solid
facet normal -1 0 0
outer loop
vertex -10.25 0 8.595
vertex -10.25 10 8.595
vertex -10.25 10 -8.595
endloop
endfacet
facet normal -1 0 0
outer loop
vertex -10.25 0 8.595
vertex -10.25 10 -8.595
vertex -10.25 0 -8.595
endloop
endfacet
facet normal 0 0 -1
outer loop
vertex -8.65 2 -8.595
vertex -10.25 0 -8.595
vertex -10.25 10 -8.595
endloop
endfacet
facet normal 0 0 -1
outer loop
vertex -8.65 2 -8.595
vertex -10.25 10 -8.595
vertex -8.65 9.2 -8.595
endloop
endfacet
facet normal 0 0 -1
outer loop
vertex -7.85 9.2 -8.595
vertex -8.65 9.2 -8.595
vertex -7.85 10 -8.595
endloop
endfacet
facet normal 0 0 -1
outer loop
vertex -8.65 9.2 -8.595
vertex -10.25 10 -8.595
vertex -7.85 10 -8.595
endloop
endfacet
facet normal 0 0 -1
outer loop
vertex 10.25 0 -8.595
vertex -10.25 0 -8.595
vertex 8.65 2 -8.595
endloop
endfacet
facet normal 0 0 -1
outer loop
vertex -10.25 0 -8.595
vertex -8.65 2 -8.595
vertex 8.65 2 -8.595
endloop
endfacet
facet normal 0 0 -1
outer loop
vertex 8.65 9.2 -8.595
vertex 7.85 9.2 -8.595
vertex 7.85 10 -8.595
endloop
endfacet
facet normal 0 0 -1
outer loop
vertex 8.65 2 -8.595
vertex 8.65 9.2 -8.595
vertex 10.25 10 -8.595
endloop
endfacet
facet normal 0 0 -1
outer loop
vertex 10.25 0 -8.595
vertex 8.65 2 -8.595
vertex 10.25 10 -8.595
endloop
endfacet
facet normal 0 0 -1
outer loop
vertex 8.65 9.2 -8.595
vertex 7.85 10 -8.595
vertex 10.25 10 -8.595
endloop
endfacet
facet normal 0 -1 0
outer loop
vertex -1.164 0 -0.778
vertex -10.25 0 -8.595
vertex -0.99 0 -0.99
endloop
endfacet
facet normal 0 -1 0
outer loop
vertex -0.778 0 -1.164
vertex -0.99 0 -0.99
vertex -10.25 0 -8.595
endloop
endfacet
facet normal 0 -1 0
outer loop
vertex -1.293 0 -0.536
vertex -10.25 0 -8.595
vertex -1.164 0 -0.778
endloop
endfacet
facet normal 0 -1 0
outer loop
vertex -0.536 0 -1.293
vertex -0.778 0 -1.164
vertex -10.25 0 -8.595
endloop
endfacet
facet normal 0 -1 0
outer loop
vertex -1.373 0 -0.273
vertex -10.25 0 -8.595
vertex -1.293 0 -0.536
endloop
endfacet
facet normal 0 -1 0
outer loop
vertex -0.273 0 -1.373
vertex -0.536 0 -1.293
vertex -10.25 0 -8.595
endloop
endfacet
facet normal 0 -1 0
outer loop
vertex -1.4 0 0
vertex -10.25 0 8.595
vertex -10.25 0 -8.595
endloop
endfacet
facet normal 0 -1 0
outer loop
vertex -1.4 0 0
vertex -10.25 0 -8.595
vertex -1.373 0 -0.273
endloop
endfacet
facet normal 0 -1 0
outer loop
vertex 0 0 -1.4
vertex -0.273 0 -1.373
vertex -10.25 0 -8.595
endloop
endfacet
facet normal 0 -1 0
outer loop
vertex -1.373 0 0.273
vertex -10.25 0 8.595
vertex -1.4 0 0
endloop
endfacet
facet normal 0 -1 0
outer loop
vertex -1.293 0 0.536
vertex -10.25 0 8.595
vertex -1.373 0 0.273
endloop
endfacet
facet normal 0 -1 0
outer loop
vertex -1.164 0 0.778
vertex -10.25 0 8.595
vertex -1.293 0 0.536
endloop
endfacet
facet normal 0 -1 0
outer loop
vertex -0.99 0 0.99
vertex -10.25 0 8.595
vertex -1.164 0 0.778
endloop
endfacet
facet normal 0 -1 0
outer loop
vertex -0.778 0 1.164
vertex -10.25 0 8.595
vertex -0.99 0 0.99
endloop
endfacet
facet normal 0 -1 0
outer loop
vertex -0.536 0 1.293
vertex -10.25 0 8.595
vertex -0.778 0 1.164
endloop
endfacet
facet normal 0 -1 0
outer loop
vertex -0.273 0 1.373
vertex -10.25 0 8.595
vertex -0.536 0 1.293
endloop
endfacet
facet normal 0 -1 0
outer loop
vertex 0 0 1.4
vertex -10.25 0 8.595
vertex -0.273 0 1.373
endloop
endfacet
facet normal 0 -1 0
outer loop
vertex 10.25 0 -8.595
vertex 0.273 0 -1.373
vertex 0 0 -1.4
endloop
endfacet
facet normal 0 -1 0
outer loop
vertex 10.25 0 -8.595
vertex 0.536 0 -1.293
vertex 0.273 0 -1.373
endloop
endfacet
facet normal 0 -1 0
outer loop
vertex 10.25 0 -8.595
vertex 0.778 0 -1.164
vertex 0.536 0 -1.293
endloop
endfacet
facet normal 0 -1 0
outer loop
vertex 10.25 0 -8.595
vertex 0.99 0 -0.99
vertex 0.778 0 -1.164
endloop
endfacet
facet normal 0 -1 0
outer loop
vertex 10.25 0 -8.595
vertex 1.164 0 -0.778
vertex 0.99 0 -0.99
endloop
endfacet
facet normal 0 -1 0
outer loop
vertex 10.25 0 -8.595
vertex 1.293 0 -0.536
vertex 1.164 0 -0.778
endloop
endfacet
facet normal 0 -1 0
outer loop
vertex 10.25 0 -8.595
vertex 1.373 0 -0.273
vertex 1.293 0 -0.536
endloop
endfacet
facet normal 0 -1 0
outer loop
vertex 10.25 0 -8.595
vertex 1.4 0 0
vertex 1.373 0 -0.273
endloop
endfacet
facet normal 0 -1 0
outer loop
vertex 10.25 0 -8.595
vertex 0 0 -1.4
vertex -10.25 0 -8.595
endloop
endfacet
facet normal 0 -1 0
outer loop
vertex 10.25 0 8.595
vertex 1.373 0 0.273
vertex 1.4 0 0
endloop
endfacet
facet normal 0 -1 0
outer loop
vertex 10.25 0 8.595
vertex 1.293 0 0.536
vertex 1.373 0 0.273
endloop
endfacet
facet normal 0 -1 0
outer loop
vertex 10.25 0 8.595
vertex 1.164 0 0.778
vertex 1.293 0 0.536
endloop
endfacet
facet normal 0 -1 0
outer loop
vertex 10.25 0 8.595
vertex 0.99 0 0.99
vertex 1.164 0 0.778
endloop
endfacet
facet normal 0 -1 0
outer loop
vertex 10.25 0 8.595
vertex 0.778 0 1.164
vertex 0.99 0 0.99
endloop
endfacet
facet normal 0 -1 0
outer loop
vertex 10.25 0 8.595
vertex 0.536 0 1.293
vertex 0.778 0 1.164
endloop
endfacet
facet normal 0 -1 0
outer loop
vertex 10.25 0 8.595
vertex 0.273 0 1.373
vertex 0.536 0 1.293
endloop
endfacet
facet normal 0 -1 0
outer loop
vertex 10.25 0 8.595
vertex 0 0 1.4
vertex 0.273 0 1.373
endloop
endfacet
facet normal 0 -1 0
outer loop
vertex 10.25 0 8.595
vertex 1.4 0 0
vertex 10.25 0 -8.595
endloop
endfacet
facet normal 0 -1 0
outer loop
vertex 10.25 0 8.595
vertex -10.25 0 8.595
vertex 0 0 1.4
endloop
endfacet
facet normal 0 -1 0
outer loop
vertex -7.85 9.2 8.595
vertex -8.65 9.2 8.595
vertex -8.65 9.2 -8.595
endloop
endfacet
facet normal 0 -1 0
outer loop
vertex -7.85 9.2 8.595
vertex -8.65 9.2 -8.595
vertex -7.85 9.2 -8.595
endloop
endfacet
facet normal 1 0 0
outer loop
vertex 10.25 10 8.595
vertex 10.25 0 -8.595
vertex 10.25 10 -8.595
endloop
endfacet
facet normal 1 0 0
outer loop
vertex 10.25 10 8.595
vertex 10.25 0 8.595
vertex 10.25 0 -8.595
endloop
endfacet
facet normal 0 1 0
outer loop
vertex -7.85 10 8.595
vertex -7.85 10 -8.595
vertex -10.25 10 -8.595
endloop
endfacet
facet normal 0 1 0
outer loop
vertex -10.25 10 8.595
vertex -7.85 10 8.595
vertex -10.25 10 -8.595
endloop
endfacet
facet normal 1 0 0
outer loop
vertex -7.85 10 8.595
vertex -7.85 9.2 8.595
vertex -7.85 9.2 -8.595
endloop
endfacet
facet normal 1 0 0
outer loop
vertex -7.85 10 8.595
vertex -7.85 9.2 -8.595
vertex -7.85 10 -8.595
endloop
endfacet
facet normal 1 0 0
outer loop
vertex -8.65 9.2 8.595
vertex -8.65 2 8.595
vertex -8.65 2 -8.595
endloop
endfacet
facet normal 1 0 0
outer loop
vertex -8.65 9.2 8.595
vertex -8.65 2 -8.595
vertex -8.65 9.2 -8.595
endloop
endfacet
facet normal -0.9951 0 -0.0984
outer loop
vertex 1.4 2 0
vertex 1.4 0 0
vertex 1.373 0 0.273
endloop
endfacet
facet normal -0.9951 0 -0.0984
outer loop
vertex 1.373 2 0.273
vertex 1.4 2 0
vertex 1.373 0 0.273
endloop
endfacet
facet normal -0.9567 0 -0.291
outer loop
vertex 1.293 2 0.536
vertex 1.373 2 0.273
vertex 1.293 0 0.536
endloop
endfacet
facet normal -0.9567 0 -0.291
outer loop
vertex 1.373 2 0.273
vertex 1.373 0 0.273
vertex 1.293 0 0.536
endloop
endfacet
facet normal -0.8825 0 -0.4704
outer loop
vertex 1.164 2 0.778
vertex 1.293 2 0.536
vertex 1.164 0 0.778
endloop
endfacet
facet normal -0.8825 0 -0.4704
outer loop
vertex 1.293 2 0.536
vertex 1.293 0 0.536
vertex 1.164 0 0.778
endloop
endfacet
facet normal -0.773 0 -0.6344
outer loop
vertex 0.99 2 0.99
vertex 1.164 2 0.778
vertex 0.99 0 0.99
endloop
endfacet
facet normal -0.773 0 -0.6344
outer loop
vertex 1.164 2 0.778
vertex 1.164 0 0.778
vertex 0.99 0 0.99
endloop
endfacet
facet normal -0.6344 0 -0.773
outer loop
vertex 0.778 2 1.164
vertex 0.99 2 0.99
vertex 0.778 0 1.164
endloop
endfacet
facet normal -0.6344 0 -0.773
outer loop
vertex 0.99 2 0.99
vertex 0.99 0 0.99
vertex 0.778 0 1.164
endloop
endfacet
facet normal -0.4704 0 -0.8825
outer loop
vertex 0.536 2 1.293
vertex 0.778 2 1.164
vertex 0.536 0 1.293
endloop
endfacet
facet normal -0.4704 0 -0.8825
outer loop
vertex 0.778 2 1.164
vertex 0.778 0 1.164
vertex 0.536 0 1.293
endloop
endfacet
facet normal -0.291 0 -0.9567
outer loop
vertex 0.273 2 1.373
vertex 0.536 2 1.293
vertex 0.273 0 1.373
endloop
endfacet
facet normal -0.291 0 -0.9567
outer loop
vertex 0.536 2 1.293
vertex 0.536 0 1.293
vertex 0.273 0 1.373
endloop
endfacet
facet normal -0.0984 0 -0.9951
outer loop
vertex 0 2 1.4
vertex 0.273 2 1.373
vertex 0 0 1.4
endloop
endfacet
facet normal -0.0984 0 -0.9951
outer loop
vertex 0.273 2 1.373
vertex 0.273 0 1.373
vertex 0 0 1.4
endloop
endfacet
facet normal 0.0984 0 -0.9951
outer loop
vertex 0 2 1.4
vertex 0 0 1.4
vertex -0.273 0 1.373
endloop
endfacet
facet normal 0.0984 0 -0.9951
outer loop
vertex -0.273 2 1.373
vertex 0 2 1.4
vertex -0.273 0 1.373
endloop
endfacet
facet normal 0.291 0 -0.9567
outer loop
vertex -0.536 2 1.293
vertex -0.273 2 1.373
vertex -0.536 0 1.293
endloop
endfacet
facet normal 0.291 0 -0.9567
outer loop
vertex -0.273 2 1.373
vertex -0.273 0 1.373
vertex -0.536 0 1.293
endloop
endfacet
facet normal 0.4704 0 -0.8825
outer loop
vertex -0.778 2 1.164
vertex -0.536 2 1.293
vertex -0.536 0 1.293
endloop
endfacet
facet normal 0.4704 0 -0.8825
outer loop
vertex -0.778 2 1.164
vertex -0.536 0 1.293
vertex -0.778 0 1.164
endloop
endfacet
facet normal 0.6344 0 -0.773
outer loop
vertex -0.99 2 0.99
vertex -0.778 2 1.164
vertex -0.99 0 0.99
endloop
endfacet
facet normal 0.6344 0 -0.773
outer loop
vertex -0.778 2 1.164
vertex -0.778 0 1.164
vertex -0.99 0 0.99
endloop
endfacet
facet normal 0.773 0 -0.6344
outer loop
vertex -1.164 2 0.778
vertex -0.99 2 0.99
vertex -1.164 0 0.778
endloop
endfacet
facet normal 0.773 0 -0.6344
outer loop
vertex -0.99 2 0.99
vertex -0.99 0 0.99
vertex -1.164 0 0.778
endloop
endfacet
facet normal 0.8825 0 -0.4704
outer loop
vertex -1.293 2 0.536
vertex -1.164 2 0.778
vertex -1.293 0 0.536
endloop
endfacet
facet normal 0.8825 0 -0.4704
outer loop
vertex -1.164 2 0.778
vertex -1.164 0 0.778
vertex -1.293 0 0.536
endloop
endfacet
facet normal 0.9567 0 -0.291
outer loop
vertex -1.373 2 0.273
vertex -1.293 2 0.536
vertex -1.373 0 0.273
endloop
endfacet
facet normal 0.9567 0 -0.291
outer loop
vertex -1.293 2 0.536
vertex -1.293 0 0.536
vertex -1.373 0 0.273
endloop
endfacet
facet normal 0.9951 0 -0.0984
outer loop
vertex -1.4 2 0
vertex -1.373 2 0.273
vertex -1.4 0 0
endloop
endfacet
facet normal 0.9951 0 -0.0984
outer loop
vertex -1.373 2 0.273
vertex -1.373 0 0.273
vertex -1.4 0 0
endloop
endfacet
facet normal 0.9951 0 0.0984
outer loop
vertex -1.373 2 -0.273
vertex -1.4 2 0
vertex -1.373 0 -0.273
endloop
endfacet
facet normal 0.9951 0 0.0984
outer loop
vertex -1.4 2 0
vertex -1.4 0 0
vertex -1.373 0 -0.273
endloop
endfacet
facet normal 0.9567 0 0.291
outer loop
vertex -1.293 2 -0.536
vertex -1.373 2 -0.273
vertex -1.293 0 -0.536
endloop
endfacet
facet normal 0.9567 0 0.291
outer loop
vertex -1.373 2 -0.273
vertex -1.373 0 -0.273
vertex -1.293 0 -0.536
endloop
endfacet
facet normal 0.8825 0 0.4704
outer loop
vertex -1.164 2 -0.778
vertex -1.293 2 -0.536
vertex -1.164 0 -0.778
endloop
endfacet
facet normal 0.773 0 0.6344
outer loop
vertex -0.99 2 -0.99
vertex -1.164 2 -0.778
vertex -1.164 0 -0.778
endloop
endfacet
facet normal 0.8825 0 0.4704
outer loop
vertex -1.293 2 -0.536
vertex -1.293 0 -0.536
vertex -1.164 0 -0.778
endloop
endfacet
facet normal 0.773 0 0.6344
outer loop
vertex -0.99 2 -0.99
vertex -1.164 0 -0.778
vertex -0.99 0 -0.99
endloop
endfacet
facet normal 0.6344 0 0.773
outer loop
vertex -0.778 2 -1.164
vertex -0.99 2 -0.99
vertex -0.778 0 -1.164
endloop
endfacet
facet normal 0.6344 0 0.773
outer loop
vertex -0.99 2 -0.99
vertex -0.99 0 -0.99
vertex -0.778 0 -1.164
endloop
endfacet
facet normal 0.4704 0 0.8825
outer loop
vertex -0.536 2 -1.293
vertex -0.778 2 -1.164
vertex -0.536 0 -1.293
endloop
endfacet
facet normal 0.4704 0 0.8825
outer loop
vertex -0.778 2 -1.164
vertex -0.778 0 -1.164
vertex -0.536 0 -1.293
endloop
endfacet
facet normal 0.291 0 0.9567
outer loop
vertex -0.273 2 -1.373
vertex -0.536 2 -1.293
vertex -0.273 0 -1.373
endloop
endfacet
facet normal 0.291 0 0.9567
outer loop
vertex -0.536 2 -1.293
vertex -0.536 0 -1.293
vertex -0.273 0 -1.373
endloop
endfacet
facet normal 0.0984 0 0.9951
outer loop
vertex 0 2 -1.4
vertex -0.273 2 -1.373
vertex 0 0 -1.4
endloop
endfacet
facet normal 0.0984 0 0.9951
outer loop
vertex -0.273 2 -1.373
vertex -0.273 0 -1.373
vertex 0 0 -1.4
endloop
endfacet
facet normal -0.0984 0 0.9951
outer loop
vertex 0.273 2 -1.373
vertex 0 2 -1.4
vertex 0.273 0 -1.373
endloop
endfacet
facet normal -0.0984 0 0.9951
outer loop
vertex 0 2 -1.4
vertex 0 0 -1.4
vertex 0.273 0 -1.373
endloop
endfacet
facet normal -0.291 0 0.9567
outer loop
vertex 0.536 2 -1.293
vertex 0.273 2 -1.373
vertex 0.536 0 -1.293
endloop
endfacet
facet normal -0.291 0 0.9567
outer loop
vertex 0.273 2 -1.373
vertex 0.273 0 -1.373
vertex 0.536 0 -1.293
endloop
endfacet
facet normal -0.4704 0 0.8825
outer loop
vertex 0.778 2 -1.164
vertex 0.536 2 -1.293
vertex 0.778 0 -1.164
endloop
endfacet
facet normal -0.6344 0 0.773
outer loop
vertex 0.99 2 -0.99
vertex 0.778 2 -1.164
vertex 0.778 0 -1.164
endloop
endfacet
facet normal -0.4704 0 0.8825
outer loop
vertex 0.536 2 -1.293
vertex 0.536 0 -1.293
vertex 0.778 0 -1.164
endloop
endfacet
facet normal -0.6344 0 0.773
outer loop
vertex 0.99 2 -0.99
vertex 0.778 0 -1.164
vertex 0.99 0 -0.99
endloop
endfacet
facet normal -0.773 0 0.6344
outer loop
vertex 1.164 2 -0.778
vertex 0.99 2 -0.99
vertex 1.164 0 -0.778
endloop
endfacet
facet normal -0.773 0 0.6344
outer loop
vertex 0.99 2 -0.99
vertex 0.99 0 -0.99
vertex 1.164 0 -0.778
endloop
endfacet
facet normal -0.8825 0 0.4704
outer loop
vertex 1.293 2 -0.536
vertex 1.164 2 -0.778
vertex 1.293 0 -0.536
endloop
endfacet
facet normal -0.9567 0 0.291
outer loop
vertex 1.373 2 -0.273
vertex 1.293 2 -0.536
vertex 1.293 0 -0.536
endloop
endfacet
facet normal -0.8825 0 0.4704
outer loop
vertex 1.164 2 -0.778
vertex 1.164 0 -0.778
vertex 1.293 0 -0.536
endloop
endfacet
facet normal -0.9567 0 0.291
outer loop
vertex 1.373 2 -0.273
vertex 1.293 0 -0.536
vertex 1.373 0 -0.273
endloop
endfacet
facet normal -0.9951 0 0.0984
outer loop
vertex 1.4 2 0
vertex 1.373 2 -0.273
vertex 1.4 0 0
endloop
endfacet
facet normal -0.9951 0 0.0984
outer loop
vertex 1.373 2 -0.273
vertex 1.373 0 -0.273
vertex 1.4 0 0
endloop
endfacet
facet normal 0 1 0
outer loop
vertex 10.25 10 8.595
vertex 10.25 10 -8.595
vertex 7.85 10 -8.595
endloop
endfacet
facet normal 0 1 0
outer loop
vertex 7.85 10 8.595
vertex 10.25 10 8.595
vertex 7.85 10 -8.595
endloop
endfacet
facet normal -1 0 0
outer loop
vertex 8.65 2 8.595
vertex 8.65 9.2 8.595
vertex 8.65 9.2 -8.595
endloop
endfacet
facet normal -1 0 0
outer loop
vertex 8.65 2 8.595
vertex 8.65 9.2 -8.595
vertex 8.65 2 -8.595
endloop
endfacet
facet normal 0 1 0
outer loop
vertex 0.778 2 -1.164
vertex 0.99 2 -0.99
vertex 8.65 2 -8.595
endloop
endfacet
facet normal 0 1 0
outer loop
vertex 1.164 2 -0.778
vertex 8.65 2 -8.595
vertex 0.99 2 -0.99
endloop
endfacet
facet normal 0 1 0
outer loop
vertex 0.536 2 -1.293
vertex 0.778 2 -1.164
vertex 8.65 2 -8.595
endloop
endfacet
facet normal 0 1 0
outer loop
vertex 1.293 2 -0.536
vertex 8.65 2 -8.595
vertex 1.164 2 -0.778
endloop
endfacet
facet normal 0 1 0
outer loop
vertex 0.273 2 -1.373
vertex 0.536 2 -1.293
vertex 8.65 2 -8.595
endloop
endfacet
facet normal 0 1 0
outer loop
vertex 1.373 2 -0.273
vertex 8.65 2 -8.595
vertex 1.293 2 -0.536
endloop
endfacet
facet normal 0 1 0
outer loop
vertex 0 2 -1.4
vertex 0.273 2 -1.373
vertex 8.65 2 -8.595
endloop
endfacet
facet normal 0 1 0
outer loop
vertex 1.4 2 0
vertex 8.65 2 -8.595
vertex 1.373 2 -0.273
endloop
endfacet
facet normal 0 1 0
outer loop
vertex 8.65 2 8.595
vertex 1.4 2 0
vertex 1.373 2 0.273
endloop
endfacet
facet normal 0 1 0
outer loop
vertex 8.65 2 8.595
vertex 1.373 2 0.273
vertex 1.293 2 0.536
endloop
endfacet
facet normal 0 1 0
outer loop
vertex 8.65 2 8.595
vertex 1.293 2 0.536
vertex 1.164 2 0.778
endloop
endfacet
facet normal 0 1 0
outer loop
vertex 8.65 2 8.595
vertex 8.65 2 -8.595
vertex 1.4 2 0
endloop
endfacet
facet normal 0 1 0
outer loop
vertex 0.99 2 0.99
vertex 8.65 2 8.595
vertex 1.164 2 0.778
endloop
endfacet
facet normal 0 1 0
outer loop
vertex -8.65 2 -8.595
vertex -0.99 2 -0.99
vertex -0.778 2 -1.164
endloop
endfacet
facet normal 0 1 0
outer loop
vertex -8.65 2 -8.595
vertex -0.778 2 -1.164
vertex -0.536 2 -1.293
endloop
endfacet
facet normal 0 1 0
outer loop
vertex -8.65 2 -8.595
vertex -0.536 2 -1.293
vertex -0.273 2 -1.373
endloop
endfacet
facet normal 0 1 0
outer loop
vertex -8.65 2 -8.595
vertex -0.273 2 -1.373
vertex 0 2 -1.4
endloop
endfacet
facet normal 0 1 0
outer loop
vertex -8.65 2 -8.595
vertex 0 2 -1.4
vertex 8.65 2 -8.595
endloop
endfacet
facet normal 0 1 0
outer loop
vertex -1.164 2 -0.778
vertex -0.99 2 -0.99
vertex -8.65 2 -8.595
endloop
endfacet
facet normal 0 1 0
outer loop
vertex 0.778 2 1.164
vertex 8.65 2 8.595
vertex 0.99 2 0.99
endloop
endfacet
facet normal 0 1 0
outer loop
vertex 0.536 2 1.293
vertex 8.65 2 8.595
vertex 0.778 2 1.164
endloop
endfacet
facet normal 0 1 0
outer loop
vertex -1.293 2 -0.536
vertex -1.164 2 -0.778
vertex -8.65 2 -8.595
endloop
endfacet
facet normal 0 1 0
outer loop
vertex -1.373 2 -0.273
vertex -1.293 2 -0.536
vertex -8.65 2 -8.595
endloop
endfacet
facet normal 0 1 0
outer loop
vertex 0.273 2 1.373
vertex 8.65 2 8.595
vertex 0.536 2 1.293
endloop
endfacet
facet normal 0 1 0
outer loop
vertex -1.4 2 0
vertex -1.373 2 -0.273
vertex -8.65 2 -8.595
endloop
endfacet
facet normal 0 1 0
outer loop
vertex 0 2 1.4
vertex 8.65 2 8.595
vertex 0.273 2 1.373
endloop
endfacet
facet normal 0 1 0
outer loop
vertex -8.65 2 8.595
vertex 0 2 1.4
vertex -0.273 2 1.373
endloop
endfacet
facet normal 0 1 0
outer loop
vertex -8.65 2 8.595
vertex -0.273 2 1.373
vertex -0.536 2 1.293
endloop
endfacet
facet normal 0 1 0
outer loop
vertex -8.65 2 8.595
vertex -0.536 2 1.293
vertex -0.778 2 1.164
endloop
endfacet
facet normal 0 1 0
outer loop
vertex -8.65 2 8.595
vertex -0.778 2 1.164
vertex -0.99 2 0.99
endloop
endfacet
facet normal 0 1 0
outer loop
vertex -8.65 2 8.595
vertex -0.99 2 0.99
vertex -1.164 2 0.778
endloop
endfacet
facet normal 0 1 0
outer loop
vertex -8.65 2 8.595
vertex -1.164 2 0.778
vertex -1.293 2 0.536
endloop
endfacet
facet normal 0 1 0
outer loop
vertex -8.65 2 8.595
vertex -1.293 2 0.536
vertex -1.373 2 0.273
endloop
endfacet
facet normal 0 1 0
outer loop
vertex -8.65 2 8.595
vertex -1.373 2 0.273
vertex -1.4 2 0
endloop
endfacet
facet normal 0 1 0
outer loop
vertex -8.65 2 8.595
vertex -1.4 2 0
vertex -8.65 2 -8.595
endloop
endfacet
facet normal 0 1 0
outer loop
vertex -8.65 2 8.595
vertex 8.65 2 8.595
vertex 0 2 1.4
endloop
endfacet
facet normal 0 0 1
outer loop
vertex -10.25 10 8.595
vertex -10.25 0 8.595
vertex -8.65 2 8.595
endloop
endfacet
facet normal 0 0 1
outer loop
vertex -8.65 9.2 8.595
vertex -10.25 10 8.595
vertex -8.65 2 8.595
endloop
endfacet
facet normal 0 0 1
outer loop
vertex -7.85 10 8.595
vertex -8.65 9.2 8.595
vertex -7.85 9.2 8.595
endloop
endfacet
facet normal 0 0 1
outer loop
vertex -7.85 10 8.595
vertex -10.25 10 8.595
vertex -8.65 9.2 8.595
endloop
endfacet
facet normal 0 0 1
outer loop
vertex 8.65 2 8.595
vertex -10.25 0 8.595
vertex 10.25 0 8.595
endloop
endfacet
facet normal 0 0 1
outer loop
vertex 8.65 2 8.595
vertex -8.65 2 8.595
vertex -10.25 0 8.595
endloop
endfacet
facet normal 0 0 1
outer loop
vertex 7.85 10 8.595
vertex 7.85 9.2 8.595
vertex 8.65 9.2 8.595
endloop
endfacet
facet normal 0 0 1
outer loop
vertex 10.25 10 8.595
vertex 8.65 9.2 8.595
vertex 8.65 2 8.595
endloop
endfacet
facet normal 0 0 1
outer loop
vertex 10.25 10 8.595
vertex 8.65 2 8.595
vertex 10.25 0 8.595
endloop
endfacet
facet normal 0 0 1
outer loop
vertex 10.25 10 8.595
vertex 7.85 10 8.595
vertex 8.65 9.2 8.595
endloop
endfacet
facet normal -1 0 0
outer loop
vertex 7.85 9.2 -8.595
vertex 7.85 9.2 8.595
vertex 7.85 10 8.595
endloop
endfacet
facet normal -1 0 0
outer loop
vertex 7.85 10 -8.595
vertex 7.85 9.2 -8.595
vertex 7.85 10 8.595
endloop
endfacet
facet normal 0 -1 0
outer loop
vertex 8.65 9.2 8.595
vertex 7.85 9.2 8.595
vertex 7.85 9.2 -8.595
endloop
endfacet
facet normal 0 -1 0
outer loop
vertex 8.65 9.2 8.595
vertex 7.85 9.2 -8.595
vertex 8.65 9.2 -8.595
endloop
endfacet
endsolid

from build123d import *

# Parameters (mm, degrees)
F0_W     = 0.8
F0_H     = 0.8
F1_DEPTH = 8.595
F2_R     = 1.4
F3_DEPTH = 2


with BuildPart() as f1:
    # F0 (on Top) → F1 (new body, symmetric)
    with BuildSketch(Plane.XY):
        with Locations((8.25, 9.6)):
            Rectangle(F0_W, F0_H)
        Polygon((8.65, 9.2), (8.65, 2), (10.25, 2), (10.25, 10), (8.65, 10), align=None)
        with Locations((-8.25, 9.6)):
            Rectangle(F0_W, F0_H)
        Polygon((-10.25, 10), (-10.25, 2), (-8.65, 2), (-8.65, 9.2), (-8.65, 10), align=None)
        Polygon((-10.25, 0), (0, 0), (0, 2), (-8.65, 2), (-10.25, 2), align=None)
        Polygon((0, 2), (0, 0), (10.25, 0), (10.25, 2), (8.65, 2), align=None)
    extrude(amount=F1_DEPTH, both=True)

    # F2 (on face) → F3 (cut, through all)
    with BuildSketch(Plane.XZ):
        Circle(F2_R)
    extrude(amount=-F3_DEPTH, mode=Mode.SUBTRACT)


solid = f1.part
